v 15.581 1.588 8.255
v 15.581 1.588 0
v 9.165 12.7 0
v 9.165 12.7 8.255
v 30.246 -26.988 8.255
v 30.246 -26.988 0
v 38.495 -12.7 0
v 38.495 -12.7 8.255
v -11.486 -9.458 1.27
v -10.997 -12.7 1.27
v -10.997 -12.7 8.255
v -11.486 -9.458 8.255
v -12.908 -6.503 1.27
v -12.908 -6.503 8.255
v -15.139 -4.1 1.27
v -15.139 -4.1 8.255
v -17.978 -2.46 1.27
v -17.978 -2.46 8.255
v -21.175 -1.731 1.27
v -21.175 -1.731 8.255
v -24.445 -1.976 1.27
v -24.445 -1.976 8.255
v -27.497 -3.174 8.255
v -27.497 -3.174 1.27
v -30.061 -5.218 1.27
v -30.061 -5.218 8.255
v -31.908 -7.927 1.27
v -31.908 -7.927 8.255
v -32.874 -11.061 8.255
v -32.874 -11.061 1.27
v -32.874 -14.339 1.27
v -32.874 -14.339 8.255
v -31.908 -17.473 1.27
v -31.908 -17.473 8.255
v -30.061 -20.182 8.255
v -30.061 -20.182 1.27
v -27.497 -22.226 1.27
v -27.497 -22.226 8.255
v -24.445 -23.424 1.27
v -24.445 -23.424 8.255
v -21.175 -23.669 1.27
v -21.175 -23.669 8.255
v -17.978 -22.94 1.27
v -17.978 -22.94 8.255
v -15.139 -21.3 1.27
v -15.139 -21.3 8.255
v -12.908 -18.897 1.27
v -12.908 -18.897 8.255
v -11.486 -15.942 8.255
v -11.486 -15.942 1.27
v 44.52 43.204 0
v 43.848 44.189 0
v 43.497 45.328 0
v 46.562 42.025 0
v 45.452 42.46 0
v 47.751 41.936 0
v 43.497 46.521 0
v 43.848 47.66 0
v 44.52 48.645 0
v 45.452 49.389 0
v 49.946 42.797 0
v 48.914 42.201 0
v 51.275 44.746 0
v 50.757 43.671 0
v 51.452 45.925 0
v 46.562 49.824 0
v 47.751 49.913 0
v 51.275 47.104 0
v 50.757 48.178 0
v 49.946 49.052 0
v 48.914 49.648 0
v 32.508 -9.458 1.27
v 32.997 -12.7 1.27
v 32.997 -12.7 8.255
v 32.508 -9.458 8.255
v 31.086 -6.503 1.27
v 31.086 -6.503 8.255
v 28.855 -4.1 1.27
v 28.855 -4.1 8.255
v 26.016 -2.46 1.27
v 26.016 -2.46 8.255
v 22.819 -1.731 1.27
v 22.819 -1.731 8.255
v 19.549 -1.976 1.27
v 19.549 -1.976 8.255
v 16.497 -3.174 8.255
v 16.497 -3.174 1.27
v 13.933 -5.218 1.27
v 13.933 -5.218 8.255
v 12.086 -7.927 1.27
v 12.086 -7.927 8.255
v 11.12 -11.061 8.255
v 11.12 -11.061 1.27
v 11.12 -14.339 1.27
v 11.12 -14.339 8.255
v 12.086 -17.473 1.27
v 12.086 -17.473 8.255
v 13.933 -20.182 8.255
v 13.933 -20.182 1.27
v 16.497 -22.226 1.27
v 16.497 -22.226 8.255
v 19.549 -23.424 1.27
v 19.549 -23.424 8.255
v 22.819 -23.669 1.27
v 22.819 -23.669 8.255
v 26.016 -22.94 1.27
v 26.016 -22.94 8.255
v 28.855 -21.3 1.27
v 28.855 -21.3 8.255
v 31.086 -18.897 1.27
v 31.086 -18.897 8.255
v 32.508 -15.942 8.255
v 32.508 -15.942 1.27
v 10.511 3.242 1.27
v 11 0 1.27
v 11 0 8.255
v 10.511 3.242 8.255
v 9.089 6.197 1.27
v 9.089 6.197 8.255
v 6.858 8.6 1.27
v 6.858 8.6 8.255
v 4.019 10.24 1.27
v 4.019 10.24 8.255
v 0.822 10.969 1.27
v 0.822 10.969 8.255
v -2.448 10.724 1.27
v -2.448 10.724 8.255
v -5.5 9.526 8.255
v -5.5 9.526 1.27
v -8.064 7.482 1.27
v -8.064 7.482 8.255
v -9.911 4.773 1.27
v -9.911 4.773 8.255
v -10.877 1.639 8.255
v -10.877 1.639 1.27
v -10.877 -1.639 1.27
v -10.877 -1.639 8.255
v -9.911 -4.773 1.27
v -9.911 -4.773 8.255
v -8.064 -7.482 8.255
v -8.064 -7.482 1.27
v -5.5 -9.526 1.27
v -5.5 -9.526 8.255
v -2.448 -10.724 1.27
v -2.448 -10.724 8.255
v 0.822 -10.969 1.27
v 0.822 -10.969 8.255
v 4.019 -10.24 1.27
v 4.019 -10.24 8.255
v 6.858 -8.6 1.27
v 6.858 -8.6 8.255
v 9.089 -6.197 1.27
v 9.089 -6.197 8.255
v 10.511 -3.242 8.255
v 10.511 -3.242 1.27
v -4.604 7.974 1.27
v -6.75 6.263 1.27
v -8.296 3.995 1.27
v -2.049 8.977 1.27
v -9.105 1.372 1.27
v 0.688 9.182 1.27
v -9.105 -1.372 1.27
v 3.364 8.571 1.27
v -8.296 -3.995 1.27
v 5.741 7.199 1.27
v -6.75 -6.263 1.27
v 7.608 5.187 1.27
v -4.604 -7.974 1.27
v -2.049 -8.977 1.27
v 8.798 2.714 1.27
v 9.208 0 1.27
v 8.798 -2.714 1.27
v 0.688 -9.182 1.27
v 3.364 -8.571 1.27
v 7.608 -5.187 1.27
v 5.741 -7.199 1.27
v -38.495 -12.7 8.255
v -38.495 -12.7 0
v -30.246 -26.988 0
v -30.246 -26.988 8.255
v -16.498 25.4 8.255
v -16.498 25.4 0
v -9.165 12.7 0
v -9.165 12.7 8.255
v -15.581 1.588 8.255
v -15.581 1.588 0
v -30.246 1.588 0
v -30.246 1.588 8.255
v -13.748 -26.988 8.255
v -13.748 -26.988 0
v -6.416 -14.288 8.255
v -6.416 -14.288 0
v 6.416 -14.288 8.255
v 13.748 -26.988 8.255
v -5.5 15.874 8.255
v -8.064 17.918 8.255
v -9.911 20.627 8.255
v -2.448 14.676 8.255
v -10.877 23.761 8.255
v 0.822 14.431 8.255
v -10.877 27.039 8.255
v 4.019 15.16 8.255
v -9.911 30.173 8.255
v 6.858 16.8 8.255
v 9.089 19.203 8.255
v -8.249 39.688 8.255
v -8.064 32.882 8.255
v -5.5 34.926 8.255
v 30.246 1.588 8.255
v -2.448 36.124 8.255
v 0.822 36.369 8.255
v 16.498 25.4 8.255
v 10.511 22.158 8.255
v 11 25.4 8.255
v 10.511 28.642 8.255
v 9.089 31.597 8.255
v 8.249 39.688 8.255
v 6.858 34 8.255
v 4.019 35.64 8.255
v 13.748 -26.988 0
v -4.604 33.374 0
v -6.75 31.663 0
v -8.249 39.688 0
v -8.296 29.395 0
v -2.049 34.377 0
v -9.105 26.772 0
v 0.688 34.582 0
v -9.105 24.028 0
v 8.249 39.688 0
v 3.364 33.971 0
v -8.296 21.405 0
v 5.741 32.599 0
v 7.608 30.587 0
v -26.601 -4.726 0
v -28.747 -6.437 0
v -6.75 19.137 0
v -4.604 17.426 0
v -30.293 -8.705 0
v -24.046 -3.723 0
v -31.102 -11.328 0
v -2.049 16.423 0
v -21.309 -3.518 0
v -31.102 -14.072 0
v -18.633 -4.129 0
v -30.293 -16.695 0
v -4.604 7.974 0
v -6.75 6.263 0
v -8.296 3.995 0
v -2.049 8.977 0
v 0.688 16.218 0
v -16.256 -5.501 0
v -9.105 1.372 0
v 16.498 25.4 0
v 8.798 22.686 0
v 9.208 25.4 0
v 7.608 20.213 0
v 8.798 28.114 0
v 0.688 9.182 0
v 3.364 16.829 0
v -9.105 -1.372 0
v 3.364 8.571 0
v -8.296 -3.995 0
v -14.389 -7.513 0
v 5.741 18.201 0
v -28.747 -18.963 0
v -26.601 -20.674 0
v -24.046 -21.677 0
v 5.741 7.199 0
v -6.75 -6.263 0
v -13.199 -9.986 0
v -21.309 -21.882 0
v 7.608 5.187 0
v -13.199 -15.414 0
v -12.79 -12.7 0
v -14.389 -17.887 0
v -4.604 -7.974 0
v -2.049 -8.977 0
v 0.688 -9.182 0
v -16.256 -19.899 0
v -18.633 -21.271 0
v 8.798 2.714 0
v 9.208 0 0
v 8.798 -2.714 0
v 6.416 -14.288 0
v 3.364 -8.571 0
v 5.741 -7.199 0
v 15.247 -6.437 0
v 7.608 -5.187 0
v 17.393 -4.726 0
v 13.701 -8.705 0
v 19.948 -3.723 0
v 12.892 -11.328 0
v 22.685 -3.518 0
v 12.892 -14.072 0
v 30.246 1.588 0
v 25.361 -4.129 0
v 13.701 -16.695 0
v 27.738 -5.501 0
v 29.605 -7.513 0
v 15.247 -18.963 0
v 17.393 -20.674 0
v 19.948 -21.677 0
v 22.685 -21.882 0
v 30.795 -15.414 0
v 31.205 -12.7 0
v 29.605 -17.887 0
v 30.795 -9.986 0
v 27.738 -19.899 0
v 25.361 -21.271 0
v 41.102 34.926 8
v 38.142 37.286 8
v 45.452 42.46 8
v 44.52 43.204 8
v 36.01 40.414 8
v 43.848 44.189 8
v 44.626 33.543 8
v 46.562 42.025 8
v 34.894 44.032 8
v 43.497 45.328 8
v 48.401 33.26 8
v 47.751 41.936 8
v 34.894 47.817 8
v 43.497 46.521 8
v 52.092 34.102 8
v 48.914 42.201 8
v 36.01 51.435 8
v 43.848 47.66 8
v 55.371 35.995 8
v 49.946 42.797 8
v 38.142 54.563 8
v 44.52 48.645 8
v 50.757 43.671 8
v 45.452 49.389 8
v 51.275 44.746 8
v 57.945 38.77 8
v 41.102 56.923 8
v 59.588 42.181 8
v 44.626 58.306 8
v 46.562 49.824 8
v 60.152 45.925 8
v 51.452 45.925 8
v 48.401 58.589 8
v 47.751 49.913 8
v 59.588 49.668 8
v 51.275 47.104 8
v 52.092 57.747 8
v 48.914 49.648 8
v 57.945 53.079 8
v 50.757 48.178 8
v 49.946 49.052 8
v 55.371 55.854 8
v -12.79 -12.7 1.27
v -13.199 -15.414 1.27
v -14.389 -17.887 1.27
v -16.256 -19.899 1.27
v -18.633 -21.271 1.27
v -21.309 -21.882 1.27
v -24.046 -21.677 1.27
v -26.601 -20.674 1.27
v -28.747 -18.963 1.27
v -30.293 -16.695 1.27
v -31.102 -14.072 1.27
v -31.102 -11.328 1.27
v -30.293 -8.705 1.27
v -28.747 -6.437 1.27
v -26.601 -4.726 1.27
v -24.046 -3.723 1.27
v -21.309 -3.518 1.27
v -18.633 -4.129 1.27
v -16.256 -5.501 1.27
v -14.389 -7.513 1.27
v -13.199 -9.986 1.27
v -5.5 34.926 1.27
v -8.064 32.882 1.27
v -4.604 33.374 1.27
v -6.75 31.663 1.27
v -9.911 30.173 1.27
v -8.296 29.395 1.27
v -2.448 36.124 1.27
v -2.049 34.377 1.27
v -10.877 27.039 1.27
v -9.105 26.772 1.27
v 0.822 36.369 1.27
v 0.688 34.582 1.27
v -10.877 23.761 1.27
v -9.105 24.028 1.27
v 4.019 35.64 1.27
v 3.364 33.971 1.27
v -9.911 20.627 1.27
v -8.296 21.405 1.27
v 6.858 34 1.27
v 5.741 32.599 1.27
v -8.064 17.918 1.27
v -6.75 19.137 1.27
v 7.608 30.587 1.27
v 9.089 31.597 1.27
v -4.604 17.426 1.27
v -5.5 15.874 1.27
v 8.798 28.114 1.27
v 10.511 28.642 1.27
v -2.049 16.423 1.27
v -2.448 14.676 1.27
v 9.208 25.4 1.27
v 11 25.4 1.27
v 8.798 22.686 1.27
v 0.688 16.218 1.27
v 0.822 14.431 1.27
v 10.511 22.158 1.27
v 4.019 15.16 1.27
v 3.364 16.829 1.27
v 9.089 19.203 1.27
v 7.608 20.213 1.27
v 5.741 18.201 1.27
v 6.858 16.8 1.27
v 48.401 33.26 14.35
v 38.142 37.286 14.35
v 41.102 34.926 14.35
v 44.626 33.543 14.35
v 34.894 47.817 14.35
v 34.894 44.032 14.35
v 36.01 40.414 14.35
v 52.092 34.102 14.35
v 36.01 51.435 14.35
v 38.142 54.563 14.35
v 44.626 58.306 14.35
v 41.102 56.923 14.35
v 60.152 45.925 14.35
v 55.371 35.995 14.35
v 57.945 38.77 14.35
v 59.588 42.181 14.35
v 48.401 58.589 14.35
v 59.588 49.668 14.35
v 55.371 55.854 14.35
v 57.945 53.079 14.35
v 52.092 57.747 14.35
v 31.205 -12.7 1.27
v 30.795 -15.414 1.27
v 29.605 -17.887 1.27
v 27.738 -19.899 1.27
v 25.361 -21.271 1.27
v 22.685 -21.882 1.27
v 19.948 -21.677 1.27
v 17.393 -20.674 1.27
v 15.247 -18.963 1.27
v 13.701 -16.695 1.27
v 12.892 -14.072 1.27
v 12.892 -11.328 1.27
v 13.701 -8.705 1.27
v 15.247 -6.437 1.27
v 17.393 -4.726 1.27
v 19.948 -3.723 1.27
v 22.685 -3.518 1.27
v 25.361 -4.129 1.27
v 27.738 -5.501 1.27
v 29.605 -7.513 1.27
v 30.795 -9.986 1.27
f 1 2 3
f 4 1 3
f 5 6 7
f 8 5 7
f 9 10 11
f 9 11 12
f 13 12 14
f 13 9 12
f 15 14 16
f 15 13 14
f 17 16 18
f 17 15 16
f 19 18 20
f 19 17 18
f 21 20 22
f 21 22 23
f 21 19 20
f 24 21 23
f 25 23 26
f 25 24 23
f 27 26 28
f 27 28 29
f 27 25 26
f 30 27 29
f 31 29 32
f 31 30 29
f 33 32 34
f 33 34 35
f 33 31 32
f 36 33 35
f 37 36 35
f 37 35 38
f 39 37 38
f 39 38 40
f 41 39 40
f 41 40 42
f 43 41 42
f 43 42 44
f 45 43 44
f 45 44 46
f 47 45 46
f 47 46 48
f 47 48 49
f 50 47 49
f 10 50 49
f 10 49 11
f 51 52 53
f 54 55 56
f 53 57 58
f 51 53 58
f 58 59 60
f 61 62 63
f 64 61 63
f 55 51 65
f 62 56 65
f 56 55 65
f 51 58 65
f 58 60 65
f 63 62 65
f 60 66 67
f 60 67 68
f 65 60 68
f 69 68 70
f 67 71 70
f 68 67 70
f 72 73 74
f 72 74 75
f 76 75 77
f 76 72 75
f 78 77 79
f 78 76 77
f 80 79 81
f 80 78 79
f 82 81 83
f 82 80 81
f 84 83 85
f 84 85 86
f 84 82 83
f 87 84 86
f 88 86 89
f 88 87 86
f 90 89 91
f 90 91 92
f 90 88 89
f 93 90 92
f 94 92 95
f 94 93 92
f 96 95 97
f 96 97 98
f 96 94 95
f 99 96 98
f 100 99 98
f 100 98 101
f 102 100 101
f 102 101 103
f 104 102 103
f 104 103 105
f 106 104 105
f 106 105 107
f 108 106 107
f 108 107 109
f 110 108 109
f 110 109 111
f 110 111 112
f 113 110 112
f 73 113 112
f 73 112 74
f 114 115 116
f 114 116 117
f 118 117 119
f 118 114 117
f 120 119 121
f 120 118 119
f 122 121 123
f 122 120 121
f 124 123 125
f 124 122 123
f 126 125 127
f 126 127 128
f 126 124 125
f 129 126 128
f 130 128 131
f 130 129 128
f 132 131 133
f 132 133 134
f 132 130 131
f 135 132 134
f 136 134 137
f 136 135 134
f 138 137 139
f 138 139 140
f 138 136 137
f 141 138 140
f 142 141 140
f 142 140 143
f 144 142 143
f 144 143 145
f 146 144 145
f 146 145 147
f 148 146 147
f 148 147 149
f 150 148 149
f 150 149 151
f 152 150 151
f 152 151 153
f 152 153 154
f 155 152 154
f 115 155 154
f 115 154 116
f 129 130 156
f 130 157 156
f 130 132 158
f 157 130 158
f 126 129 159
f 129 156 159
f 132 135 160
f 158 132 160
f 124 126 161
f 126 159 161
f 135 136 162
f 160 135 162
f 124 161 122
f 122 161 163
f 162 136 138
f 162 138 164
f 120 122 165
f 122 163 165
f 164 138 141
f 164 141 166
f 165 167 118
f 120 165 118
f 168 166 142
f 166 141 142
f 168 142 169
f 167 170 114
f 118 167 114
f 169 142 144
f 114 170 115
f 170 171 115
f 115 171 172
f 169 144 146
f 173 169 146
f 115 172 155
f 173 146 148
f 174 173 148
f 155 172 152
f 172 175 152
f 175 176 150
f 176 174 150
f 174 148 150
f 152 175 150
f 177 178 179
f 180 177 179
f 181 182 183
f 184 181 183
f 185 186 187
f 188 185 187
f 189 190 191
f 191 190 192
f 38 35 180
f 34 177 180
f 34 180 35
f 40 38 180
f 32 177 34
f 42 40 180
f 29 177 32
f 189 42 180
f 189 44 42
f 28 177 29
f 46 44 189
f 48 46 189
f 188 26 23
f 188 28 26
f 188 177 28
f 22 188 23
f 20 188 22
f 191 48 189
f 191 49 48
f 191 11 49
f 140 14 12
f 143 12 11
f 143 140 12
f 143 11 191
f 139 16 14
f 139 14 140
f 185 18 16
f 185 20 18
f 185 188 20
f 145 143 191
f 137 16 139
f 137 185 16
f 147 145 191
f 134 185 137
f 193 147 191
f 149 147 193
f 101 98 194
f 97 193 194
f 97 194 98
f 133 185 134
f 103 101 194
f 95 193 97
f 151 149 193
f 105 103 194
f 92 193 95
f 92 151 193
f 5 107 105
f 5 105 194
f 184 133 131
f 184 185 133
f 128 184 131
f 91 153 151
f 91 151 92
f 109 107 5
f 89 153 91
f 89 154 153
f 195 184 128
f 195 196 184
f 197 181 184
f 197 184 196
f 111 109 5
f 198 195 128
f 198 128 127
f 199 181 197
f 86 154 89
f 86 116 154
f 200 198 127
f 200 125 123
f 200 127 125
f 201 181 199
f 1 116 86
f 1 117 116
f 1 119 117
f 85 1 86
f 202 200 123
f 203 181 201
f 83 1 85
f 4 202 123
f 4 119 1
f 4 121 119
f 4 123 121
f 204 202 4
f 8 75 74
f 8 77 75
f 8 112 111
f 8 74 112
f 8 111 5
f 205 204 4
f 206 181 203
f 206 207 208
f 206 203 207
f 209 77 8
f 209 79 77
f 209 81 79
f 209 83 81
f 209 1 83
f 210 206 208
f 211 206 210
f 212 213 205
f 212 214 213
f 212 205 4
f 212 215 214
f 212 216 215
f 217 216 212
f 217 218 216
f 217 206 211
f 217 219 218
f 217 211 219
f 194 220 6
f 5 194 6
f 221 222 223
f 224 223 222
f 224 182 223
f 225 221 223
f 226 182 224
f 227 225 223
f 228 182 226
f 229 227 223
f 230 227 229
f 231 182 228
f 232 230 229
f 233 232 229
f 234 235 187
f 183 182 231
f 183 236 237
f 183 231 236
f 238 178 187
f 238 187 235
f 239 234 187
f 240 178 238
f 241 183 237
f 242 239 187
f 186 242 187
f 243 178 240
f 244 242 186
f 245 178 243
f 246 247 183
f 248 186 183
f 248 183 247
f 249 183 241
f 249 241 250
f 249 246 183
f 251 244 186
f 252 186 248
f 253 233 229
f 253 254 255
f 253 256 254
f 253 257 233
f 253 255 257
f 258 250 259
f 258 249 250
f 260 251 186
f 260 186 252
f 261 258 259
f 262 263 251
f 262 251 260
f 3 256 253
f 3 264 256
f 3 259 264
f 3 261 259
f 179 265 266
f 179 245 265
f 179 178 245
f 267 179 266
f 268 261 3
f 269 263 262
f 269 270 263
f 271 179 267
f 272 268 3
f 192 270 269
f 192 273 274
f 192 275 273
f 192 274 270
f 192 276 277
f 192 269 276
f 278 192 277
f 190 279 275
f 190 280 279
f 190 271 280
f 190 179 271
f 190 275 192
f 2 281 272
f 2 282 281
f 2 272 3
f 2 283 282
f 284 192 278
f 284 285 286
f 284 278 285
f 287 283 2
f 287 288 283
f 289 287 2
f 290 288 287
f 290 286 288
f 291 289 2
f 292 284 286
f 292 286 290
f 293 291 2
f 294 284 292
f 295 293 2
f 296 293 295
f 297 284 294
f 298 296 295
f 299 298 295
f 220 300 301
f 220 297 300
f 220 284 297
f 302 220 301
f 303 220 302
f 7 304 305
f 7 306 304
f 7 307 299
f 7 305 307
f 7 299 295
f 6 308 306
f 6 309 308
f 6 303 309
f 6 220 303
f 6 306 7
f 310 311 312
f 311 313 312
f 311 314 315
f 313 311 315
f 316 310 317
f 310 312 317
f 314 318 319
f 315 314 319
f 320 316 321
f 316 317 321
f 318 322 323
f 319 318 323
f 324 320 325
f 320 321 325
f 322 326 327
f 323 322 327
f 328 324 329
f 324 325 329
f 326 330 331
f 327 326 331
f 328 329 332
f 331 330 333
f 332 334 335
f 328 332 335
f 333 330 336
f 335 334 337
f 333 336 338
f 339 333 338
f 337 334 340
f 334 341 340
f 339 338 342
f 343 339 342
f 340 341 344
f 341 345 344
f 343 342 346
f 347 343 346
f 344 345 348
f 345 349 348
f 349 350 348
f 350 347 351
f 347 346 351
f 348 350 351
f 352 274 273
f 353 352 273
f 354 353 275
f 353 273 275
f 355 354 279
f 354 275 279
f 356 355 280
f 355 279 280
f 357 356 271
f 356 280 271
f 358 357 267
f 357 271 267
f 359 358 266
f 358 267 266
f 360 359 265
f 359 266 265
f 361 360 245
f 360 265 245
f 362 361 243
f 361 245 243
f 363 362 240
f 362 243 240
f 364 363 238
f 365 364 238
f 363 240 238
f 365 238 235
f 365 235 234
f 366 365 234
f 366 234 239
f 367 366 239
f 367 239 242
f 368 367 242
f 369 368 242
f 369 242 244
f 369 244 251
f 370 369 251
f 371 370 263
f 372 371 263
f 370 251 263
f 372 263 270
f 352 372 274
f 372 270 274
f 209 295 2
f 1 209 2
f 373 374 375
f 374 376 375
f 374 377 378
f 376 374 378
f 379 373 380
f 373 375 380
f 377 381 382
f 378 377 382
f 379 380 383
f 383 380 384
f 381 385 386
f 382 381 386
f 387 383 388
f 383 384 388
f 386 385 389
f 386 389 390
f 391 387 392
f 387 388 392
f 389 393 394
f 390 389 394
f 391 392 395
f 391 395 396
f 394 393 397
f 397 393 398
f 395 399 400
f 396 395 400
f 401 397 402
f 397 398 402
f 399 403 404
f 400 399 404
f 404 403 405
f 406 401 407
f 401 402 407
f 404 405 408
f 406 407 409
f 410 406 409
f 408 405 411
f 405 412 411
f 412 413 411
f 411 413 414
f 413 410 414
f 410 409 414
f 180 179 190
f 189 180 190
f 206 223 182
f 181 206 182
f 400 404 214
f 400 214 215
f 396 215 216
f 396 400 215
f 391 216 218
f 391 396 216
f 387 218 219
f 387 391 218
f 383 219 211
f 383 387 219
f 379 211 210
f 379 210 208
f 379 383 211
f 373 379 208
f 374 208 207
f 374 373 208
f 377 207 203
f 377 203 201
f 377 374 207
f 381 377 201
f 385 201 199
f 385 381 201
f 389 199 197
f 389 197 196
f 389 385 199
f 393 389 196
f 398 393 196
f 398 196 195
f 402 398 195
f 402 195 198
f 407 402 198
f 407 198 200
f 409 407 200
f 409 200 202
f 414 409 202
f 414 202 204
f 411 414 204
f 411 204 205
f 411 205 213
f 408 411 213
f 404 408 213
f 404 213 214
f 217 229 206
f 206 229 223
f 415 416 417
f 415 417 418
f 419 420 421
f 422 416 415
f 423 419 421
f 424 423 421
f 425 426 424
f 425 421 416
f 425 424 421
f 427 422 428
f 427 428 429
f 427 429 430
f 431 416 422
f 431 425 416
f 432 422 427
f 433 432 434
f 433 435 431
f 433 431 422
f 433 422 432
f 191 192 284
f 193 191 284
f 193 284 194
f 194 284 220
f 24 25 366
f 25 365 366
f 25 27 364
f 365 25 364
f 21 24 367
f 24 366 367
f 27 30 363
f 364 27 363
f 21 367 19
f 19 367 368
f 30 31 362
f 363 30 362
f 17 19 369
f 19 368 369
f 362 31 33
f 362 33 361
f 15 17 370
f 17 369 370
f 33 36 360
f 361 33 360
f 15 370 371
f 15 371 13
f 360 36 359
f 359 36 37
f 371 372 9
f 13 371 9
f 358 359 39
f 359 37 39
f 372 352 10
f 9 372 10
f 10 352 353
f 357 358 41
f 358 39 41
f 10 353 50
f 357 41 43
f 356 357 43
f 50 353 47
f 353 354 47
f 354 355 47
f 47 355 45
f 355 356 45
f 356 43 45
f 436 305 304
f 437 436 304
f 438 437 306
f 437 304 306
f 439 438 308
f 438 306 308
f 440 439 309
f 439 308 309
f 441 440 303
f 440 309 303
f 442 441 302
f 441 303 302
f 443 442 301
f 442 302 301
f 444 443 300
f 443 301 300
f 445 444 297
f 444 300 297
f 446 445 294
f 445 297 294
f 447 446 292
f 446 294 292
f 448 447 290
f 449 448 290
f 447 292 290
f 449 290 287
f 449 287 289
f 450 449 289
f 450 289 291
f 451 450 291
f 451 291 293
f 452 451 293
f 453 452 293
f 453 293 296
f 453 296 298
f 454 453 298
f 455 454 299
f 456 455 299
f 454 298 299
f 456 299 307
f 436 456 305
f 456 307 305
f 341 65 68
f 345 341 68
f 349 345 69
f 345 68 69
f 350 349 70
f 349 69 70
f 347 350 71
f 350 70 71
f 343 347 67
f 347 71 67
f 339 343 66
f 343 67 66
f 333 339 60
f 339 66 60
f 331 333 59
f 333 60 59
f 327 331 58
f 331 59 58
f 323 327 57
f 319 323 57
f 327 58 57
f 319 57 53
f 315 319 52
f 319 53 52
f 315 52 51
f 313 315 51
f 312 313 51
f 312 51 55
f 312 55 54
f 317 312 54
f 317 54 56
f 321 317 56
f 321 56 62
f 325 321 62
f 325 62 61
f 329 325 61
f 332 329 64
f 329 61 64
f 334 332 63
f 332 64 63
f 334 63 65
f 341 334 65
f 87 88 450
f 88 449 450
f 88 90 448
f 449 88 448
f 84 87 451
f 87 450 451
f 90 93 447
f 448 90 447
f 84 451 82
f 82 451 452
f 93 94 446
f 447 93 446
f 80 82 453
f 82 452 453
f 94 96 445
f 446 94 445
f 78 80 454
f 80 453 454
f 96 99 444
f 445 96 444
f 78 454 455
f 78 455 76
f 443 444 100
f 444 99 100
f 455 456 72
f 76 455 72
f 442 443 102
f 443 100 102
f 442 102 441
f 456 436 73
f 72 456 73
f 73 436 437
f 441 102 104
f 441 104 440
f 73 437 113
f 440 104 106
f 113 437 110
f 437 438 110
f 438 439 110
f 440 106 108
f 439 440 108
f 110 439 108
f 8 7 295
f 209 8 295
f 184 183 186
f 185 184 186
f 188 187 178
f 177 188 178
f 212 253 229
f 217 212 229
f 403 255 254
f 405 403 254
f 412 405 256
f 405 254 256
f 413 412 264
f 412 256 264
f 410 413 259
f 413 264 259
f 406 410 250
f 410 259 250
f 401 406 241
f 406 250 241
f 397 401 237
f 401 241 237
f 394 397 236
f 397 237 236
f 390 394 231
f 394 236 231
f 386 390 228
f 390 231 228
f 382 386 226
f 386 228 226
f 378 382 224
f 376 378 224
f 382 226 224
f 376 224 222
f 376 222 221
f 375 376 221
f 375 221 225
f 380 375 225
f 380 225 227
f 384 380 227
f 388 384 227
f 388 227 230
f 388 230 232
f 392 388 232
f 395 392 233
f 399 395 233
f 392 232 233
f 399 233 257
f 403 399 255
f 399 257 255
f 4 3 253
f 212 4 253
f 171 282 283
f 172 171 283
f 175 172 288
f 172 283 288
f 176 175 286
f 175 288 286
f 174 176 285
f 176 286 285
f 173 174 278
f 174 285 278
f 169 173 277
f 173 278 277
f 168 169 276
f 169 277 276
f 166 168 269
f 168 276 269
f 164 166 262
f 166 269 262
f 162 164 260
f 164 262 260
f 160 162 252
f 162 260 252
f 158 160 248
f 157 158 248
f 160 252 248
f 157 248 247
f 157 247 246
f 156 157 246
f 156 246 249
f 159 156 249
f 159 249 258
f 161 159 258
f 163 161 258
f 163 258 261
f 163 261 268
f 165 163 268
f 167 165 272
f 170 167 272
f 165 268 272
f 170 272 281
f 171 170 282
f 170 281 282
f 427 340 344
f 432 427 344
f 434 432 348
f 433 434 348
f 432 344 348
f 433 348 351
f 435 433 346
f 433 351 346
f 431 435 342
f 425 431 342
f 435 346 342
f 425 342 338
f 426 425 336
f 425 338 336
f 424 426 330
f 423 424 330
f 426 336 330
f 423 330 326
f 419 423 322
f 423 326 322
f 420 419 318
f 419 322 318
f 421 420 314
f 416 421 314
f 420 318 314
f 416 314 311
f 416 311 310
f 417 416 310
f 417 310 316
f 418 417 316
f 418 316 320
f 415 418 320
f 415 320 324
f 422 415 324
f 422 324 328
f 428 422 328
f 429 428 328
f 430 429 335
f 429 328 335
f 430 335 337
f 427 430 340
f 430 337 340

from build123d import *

# Parameters (mm, degrees)
F0_R     = 11
F1_DEPTH = 8.255
F2_R     = 4
F3_DEPTH = 8
F4_R     = 12.7
F5_DEPTH = 6.35
F6_R     = 11
F6_R_2   = 9.2075
F7_DEPTH = 1.27


with BuildPart() as f1:
    # F0 (on Top) → F1 (new body)
    with BuildSketch(Plane.XY):
        Polygon((8.248892, 39.6875), (-8.248892, 39.6875), (-16.497784, 25.4), (-9.165436, 12.7), (-15.58124, 1.5875), (-30.245937, 1.5875), (-38.494829, -12.7), (-30.245937, -26.9875), (-13.748153, -26.9875), (-6.415805, -14.2875), (6.415805, -14.2875), (13.748153, -26.9875), (30.245937, -26.9875), (38.494829, -12.7), (30.245937, 1.5875), (15.58124, 1.5875), (9.165436, 12.7), (16.497784, 25.4), align=None)
        with Locations((-21.997045, -12.7)):
            Circle(F0_R, mode=Mode.SUBTRACT)
        Circle(F0_R, mode=Mode.SUBTRACT)
        with Locations((21.997045, -12.7)):
            Circle(F0_R, mode=Mode.SUBTRACT)
        with Locations((0, 25.4)):
            Circle(F0_R, mode=Mode.SUBTRACT)
    extrude(amount=F1_DEPTH)

    # F6 (on face) → F7 (join)
    with BuildSketch(Plane(origin=(0, 0, 0), x_dir=(1, 0, 0), z_dir=(0, 0, -1))):
        with Locations((-21.997045, 12.7)):
            Circle(F6_R)
        with Locations((-21.997045, 12.7)):
            Circle(F6_R_2, mode=Mode.SUBTRACT)
        with Locations((21.997045, 12.7)):
            Circle(F6_R)
        with Locations((21.997045, 12.7)):
            Circle(F6_R_2, mode=Mode.SUBTRACT)
        Circle(F6_R)
        Circle(F6_R_2, mode=Mode.SUBTRACT)
        with Locations((0, -25.4)):
            Circle(F6_R)
        with Locations((0, -25.4)):
            Circle(F6_R_2, mode=Mode.SUBTRACT)
    extrude(amount=-F7_DEPTH)


with BuildPart() as f3:
    # F2 (on Top) → F3 (new body)
    with BuildSketch(Plane.XY):
        with Locations((47.45223, 45.924596)):
            Circle(F2_R)
    extrude(amount=F3_DEPTH)

    # F4 (on face) → F5 (join)
    with BuildSketch(Plane.XY.offset(8)):
        with Locations((47.45223, 45.924596)):
            Circle(F4_R)
    extrude(amount=F5_DEPTH)


solid = Compound([f1.part, f3.part])
